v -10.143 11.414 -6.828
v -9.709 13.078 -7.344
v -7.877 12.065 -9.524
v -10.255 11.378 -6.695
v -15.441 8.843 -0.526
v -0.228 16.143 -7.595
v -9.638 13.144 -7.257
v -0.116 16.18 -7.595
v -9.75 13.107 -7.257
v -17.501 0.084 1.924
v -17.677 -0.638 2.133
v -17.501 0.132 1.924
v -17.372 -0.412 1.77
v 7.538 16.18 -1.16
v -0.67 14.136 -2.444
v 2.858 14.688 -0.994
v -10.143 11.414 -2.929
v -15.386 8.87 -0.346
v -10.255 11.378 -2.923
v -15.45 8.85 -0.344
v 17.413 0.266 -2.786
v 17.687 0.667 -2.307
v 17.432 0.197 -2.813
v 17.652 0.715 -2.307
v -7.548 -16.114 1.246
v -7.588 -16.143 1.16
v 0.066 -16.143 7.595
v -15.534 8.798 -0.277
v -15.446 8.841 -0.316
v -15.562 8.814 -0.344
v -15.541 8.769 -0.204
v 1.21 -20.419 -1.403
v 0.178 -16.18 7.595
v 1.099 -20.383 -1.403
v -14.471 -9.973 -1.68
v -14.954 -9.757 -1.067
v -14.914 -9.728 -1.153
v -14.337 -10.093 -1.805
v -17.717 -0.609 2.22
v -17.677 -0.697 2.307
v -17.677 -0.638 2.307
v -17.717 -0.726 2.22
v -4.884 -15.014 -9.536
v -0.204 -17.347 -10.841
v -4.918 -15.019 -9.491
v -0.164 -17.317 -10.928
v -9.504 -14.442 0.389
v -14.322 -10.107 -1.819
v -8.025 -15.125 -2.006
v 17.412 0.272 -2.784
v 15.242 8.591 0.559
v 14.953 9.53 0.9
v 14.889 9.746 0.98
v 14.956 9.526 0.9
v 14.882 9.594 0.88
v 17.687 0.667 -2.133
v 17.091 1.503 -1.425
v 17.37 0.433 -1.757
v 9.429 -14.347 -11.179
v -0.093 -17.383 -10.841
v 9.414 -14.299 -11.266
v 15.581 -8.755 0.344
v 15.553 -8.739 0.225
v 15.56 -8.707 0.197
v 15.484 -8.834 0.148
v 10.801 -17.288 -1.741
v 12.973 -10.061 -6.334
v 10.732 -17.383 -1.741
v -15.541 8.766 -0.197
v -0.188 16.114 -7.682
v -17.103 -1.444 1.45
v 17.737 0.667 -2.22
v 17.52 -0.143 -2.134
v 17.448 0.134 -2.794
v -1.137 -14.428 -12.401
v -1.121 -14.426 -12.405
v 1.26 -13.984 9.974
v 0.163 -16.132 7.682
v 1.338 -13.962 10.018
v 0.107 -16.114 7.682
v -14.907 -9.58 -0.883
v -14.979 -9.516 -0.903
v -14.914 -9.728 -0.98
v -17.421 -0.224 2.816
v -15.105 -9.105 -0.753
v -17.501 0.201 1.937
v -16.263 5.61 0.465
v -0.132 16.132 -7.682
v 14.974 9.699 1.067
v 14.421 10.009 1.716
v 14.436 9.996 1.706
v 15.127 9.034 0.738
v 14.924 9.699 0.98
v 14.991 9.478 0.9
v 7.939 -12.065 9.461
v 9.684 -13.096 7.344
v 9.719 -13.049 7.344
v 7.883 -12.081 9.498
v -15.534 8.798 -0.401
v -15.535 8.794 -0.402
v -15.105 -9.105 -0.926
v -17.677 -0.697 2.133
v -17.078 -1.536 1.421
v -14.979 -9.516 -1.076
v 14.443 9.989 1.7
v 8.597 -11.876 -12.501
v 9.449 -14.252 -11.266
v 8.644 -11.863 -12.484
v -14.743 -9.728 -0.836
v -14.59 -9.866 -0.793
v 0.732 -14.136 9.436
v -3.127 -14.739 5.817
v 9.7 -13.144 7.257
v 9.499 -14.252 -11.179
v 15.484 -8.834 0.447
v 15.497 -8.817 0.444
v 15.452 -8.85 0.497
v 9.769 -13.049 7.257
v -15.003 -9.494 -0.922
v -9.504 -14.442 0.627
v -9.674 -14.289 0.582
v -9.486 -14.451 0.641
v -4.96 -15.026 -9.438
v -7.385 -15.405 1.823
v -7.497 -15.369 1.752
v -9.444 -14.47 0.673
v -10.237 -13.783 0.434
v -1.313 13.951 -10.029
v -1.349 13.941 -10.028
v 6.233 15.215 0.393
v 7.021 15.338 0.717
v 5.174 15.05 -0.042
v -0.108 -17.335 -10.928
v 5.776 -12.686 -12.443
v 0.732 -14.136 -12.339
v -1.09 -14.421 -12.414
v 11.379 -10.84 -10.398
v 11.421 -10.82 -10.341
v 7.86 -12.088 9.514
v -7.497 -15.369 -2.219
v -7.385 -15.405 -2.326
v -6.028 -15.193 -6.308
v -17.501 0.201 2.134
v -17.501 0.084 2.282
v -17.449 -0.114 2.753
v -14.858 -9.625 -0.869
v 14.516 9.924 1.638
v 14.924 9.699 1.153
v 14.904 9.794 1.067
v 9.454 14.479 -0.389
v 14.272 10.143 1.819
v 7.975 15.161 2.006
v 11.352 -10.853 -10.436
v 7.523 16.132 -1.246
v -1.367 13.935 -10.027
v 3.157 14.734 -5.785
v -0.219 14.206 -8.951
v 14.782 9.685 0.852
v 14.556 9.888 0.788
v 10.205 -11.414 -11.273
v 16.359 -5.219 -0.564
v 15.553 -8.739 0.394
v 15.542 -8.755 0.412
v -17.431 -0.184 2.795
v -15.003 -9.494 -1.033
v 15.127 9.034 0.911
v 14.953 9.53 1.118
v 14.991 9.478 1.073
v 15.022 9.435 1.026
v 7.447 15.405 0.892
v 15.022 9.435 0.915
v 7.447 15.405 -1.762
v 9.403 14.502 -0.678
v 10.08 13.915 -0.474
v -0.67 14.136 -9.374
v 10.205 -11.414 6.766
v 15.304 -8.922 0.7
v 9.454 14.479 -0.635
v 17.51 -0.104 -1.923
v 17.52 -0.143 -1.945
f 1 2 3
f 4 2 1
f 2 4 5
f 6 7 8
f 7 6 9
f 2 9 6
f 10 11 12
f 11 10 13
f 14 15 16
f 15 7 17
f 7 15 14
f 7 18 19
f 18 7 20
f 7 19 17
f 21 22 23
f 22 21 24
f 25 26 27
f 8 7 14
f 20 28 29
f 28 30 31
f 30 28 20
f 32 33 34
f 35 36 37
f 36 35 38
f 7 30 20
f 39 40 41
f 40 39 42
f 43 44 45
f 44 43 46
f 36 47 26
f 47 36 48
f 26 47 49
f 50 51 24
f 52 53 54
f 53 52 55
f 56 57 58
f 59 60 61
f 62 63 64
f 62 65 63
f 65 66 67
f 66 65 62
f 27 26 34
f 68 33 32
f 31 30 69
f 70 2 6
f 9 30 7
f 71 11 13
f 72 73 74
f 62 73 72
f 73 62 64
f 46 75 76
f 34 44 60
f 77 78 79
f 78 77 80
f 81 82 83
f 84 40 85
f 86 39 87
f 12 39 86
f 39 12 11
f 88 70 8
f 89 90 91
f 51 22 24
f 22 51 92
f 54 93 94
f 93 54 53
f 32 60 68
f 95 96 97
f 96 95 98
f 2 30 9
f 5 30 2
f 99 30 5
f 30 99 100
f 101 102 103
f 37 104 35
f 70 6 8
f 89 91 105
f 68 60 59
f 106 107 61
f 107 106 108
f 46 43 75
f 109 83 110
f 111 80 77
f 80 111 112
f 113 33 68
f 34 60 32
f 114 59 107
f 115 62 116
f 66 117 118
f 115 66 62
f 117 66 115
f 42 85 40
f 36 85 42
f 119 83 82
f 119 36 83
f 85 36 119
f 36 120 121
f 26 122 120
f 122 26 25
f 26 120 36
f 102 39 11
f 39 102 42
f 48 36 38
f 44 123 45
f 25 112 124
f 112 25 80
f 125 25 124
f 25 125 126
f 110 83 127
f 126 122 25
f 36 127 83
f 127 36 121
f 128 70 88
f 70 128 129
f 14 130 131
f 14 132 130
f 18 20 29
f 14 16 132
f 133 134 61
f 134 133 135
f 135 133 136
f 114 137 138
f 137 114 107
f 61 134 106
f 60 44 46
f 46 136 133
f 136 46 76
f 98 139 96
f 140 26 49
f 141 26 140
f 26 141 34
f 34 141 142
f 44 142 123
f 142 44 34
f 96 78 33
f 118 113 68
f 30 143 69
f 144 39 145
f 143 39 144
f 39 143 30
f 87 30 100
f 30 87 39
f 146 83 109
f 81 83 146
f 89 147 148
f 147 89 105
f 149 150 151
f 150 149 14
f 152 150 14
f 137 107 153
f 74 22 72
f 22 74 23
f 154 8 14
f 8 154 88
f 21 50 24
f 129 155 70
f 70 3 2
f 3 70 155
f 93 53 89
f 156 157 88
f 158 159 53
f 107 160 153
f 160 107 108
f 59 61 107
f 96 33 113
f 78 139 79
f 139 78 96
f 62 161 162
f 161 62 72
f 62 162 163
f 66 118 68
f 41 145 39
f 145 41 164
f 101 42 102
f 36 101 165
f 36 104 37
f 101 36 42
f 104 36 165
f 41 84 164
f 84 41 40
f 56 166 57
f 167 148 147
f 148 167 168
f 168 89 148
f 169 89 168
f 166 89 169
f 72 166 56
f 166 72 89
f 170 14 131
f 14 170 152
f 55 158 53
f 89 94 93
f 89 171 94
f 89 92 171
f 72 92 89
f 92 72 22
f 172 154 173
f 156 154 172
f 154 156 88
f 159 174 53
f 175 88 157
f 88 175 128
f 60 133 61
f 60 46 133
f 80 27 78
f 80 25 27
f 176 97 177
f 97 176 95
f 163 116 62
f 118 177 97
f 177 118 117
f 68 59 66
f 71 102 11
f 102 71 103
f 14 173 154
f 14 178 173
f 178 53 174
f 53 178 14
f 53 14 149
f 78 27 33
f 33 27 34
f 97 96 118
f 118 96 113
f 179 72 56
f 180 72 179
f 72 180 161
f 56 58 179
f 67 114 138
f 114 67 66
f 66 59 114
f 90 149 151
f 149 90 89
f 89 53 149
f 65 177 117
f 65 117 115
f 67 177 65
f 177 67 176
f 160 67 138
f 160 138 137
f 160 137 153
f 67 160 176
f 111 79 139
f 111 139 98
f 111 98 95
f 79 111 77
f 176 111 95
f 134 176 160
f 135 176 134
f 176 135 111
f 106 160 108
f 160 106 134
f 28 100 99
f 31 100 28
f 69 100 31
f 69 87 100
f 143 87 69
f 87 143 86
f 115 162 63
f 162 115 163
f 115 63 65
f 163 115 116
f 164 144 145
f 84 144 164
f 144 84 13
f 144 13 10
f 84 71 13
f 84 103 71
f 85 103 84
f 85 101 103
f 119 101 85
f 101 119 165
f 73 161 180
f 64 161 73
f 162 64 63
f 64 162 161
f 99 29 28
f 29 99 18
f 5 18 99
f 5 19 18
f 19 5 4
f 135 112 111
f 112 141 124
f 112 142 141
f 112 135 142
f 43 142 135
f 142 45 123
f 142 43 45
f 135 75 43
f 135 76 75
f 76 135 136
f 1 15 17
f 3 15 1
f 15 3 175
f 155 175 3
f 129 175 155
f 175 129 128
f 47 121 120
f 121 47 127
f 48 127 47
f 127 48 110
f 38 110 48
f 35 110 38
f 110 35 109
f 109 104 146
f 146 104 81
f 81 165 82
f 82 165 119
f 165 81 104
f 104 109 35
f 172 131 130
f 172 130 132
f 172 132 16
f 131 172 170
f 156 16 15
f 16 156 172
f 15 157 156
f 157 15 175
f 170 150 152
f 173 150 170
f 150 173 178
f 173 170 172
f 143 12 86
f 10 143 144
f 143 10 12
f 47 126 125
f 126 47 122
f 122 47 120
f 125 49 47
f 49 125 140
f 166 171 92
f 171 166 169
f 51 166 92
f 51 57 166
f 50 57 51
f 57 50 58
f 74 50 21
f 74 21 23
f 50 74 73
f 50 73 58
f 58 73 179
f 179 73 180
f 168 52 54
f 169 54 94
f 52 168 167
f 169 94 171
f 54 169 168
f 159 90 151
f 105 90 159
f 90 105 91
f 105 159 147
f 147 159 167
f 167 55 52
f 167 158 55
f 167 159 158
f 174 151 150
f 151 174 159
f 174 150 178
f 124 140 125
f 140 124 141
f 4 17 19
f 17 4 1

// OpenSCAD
// Auto-generated OpenSCAD file

    inner_points = 10*[[-0.21767207125666155, -0.32071847091711014, 1.7360795183920927], [-1.4922229350476093, -0.9435162185789954, -0.21739691757103918], [-0.46744991045730744, 0.6370588317477957, 1.5936938816719737], [-1.7420007742482555, 0.014261084085910432, -0.35978255429115813], [1.7420007742482542, -0.014261084085911972, 0.35978255429115813], [0.4674499104573061, -0.6370588317477972, -1.5936938816719737], [1.492222935047608, 0.9435162185789938, 0.21739691757103918], [0.21767207125666022, 0.3207184709171086, -1.7360795183920927], [-0.4143597724049588, -1.1803825334804832, 1.2646013664549804], [-0.942296026121513, -1.4383538071774526, 0.4554449329027941], [-1.017376819383404, 1.131896420346253, 0.9208520311981405], [-1.545313073099958, 0.8739251466492834, 0.11169559764595427], [1.5453130730999567, -0.873925146649285, -0.11169559764595427], [1.0173768193834027, -1.1318964203462543, -0.9208520311981405], [0.9422960261215116, 1.4383538071774513, -0.4554449329027941], [0.41435977240495747, 1.1803825334804818, -1.2646013664549804], [0.5329224201734905, -0.9082100060398764, 1.4336533198017478], [-0.7416284436174575, -1.5310077537017615, -0.5198231161613842], [-0.07009462680495482, 1.4040689477868598, 1.089903984544908], [-1.3446454905959027, 0.7812712001249748, -0.8635724514182238], [1.3446454905959013, -0.7812712001249763, 0.8635724514182238], [0.07009462680495349, -1.404068947786861, -1.089903984544908], [0.7416284436174562, 1.5310077537017601, 0.5198231161613842], [-0.5329224201734918, 0.9082100060398749, -1.4336533198017478], [0.43660784939141806, 0.40405282035525075, 1.9520062670457445], [1.584557624473923, 0.5835714012715488, 1.1457901713283336], [1.1872023408215704, -0.18343871476751553, 1.6495800684553996], [0.8339631330437706, 1.1710629363943152, 1.4482163699186787]];

    outer_points = 10*[[-0.2998492432811004, -0.8754891635864159, -1.5191519733455254], [-0.9669049177063294, 1.3048578449672972, -0.7257096161108192], [-0.8810229625548427, -1.3048578449672972, -0.8278635794933151], [-1.5480786369800716, 0.8754891635864159, -0.034421222258608775], [1.5480786369800716, -0.8754891635864159, 0.034421222258608775], [0.8810229625548427, 1.3048578449672972, 0.8278635794933151], [0.9669049177063294, -1.3048578449672972, 0.7257096161108192], [0.2998492432811004, 0.8754891635864159, 1.5191519733455254], [-0.084273448945414, 0.0667291961127105, -1.775572798440574], [-0.36057695615027563, 0.9698584977352651, -1.4469182131126805], [-1.4873509241108964, -0.9698584977352651, -0.10665498249145389], [-1.763654431315758, -0.0667291961127105, 0.2219996028364397], [1.763654431315758, 0.0667291961127105, -0.2219996028364397], [1.4873509241108964, 0.9698584977352651, 0.10665498249145389], [0.36057695615027563, -0.9698584977352651, 1.4469182131126805], [0.084273448945414, -0.0667291961127105, 1.775572798440574], [0.6523481796495847, -0.5718796573528687, -1.5529356304711843], [-0.01470749477564448, 1.6084673512008445, -0.7594932732364776], [-0.7507292955158978, -1.6084673512008445, 0.11598218547793598], [-1.417784969941127, 0.5718796573528687, 0.9094245427126425], [1.417784969941127, -0.5718796573528687, -0.9094245427126425], [0.7507292955158978, 1.6084673512008445, -0.11598218547793598], [0.01470749477564448, -1.6084673512008445, 0.7594932732364776], [-0.6523481796495847, 0.5718796573528687, 1.5529356304711843], [-0.012341624162016562, -1.728782357742436, -1.0841461184935561], [1.0701494658076132, -1.728782357742436, -0.17408401064796336], [0.9398557987686684, -1.4251728515088886, -1.1179297756192146], [0.11795204287692822, -2.0323918639759833, -0.1403003535223048]];

    // Convex hull for inner set (I)
    module inner_hull() {
        hull() {
            for (p = inner_points) {
                translate(p) sphere(r=0.1);
            }
        }
    }

    // Convex hull for outer set (O) minus inner hull (O \ I)
    module outer_minus_inner() {
        difference() {
            hull() {
                for (p = outer_points) {
                    translate(p) sphere(r=0.1);
                }
            }
            inner_hull(); // Subtract inner hull
        }
    }

    // Convex hull for outer set (O) minus all translated inner hulls
    module outer_minus_AllTranslationInner() {
        difference() {
            hull() {
                for (p = outer_points) {
                    translate(p) sphere(r=0.1);
                }
            }
            hull() {
                translate([0,0,50]) inner_hull();
                translate([0,0,-50]) inner_hull();
            }; // Subtract translated inner hulls
        }
    }

    // Difference between outer_minus_inner and outer_minus_AllTranslationInner
    module outer_minus_inner_diff() {
        difference() {
            // Outer minus inner
            difference() {
                hull() {
                    for (p = outer_points) {
                        translate(p) sphere(r=0.1);
                    }
                }
                inner_hull();
            }

            // Subtract Outer minus AllTranslationInner
            difference() {
                hull() {
                    for (p = outer_points) {
                        translate(p) sphere(r=0.1);
                    }
                }
                hull() {
                    translate([0,0,50]) inner_hull();
                    translate([0,0,-50]) inner_hull();
                };
            }
        }
    }

    // Rendering all with colors applied
    color([0, 1, 0, 1]) outer_minus_AllTranslationInner(); // Opaque green
    
